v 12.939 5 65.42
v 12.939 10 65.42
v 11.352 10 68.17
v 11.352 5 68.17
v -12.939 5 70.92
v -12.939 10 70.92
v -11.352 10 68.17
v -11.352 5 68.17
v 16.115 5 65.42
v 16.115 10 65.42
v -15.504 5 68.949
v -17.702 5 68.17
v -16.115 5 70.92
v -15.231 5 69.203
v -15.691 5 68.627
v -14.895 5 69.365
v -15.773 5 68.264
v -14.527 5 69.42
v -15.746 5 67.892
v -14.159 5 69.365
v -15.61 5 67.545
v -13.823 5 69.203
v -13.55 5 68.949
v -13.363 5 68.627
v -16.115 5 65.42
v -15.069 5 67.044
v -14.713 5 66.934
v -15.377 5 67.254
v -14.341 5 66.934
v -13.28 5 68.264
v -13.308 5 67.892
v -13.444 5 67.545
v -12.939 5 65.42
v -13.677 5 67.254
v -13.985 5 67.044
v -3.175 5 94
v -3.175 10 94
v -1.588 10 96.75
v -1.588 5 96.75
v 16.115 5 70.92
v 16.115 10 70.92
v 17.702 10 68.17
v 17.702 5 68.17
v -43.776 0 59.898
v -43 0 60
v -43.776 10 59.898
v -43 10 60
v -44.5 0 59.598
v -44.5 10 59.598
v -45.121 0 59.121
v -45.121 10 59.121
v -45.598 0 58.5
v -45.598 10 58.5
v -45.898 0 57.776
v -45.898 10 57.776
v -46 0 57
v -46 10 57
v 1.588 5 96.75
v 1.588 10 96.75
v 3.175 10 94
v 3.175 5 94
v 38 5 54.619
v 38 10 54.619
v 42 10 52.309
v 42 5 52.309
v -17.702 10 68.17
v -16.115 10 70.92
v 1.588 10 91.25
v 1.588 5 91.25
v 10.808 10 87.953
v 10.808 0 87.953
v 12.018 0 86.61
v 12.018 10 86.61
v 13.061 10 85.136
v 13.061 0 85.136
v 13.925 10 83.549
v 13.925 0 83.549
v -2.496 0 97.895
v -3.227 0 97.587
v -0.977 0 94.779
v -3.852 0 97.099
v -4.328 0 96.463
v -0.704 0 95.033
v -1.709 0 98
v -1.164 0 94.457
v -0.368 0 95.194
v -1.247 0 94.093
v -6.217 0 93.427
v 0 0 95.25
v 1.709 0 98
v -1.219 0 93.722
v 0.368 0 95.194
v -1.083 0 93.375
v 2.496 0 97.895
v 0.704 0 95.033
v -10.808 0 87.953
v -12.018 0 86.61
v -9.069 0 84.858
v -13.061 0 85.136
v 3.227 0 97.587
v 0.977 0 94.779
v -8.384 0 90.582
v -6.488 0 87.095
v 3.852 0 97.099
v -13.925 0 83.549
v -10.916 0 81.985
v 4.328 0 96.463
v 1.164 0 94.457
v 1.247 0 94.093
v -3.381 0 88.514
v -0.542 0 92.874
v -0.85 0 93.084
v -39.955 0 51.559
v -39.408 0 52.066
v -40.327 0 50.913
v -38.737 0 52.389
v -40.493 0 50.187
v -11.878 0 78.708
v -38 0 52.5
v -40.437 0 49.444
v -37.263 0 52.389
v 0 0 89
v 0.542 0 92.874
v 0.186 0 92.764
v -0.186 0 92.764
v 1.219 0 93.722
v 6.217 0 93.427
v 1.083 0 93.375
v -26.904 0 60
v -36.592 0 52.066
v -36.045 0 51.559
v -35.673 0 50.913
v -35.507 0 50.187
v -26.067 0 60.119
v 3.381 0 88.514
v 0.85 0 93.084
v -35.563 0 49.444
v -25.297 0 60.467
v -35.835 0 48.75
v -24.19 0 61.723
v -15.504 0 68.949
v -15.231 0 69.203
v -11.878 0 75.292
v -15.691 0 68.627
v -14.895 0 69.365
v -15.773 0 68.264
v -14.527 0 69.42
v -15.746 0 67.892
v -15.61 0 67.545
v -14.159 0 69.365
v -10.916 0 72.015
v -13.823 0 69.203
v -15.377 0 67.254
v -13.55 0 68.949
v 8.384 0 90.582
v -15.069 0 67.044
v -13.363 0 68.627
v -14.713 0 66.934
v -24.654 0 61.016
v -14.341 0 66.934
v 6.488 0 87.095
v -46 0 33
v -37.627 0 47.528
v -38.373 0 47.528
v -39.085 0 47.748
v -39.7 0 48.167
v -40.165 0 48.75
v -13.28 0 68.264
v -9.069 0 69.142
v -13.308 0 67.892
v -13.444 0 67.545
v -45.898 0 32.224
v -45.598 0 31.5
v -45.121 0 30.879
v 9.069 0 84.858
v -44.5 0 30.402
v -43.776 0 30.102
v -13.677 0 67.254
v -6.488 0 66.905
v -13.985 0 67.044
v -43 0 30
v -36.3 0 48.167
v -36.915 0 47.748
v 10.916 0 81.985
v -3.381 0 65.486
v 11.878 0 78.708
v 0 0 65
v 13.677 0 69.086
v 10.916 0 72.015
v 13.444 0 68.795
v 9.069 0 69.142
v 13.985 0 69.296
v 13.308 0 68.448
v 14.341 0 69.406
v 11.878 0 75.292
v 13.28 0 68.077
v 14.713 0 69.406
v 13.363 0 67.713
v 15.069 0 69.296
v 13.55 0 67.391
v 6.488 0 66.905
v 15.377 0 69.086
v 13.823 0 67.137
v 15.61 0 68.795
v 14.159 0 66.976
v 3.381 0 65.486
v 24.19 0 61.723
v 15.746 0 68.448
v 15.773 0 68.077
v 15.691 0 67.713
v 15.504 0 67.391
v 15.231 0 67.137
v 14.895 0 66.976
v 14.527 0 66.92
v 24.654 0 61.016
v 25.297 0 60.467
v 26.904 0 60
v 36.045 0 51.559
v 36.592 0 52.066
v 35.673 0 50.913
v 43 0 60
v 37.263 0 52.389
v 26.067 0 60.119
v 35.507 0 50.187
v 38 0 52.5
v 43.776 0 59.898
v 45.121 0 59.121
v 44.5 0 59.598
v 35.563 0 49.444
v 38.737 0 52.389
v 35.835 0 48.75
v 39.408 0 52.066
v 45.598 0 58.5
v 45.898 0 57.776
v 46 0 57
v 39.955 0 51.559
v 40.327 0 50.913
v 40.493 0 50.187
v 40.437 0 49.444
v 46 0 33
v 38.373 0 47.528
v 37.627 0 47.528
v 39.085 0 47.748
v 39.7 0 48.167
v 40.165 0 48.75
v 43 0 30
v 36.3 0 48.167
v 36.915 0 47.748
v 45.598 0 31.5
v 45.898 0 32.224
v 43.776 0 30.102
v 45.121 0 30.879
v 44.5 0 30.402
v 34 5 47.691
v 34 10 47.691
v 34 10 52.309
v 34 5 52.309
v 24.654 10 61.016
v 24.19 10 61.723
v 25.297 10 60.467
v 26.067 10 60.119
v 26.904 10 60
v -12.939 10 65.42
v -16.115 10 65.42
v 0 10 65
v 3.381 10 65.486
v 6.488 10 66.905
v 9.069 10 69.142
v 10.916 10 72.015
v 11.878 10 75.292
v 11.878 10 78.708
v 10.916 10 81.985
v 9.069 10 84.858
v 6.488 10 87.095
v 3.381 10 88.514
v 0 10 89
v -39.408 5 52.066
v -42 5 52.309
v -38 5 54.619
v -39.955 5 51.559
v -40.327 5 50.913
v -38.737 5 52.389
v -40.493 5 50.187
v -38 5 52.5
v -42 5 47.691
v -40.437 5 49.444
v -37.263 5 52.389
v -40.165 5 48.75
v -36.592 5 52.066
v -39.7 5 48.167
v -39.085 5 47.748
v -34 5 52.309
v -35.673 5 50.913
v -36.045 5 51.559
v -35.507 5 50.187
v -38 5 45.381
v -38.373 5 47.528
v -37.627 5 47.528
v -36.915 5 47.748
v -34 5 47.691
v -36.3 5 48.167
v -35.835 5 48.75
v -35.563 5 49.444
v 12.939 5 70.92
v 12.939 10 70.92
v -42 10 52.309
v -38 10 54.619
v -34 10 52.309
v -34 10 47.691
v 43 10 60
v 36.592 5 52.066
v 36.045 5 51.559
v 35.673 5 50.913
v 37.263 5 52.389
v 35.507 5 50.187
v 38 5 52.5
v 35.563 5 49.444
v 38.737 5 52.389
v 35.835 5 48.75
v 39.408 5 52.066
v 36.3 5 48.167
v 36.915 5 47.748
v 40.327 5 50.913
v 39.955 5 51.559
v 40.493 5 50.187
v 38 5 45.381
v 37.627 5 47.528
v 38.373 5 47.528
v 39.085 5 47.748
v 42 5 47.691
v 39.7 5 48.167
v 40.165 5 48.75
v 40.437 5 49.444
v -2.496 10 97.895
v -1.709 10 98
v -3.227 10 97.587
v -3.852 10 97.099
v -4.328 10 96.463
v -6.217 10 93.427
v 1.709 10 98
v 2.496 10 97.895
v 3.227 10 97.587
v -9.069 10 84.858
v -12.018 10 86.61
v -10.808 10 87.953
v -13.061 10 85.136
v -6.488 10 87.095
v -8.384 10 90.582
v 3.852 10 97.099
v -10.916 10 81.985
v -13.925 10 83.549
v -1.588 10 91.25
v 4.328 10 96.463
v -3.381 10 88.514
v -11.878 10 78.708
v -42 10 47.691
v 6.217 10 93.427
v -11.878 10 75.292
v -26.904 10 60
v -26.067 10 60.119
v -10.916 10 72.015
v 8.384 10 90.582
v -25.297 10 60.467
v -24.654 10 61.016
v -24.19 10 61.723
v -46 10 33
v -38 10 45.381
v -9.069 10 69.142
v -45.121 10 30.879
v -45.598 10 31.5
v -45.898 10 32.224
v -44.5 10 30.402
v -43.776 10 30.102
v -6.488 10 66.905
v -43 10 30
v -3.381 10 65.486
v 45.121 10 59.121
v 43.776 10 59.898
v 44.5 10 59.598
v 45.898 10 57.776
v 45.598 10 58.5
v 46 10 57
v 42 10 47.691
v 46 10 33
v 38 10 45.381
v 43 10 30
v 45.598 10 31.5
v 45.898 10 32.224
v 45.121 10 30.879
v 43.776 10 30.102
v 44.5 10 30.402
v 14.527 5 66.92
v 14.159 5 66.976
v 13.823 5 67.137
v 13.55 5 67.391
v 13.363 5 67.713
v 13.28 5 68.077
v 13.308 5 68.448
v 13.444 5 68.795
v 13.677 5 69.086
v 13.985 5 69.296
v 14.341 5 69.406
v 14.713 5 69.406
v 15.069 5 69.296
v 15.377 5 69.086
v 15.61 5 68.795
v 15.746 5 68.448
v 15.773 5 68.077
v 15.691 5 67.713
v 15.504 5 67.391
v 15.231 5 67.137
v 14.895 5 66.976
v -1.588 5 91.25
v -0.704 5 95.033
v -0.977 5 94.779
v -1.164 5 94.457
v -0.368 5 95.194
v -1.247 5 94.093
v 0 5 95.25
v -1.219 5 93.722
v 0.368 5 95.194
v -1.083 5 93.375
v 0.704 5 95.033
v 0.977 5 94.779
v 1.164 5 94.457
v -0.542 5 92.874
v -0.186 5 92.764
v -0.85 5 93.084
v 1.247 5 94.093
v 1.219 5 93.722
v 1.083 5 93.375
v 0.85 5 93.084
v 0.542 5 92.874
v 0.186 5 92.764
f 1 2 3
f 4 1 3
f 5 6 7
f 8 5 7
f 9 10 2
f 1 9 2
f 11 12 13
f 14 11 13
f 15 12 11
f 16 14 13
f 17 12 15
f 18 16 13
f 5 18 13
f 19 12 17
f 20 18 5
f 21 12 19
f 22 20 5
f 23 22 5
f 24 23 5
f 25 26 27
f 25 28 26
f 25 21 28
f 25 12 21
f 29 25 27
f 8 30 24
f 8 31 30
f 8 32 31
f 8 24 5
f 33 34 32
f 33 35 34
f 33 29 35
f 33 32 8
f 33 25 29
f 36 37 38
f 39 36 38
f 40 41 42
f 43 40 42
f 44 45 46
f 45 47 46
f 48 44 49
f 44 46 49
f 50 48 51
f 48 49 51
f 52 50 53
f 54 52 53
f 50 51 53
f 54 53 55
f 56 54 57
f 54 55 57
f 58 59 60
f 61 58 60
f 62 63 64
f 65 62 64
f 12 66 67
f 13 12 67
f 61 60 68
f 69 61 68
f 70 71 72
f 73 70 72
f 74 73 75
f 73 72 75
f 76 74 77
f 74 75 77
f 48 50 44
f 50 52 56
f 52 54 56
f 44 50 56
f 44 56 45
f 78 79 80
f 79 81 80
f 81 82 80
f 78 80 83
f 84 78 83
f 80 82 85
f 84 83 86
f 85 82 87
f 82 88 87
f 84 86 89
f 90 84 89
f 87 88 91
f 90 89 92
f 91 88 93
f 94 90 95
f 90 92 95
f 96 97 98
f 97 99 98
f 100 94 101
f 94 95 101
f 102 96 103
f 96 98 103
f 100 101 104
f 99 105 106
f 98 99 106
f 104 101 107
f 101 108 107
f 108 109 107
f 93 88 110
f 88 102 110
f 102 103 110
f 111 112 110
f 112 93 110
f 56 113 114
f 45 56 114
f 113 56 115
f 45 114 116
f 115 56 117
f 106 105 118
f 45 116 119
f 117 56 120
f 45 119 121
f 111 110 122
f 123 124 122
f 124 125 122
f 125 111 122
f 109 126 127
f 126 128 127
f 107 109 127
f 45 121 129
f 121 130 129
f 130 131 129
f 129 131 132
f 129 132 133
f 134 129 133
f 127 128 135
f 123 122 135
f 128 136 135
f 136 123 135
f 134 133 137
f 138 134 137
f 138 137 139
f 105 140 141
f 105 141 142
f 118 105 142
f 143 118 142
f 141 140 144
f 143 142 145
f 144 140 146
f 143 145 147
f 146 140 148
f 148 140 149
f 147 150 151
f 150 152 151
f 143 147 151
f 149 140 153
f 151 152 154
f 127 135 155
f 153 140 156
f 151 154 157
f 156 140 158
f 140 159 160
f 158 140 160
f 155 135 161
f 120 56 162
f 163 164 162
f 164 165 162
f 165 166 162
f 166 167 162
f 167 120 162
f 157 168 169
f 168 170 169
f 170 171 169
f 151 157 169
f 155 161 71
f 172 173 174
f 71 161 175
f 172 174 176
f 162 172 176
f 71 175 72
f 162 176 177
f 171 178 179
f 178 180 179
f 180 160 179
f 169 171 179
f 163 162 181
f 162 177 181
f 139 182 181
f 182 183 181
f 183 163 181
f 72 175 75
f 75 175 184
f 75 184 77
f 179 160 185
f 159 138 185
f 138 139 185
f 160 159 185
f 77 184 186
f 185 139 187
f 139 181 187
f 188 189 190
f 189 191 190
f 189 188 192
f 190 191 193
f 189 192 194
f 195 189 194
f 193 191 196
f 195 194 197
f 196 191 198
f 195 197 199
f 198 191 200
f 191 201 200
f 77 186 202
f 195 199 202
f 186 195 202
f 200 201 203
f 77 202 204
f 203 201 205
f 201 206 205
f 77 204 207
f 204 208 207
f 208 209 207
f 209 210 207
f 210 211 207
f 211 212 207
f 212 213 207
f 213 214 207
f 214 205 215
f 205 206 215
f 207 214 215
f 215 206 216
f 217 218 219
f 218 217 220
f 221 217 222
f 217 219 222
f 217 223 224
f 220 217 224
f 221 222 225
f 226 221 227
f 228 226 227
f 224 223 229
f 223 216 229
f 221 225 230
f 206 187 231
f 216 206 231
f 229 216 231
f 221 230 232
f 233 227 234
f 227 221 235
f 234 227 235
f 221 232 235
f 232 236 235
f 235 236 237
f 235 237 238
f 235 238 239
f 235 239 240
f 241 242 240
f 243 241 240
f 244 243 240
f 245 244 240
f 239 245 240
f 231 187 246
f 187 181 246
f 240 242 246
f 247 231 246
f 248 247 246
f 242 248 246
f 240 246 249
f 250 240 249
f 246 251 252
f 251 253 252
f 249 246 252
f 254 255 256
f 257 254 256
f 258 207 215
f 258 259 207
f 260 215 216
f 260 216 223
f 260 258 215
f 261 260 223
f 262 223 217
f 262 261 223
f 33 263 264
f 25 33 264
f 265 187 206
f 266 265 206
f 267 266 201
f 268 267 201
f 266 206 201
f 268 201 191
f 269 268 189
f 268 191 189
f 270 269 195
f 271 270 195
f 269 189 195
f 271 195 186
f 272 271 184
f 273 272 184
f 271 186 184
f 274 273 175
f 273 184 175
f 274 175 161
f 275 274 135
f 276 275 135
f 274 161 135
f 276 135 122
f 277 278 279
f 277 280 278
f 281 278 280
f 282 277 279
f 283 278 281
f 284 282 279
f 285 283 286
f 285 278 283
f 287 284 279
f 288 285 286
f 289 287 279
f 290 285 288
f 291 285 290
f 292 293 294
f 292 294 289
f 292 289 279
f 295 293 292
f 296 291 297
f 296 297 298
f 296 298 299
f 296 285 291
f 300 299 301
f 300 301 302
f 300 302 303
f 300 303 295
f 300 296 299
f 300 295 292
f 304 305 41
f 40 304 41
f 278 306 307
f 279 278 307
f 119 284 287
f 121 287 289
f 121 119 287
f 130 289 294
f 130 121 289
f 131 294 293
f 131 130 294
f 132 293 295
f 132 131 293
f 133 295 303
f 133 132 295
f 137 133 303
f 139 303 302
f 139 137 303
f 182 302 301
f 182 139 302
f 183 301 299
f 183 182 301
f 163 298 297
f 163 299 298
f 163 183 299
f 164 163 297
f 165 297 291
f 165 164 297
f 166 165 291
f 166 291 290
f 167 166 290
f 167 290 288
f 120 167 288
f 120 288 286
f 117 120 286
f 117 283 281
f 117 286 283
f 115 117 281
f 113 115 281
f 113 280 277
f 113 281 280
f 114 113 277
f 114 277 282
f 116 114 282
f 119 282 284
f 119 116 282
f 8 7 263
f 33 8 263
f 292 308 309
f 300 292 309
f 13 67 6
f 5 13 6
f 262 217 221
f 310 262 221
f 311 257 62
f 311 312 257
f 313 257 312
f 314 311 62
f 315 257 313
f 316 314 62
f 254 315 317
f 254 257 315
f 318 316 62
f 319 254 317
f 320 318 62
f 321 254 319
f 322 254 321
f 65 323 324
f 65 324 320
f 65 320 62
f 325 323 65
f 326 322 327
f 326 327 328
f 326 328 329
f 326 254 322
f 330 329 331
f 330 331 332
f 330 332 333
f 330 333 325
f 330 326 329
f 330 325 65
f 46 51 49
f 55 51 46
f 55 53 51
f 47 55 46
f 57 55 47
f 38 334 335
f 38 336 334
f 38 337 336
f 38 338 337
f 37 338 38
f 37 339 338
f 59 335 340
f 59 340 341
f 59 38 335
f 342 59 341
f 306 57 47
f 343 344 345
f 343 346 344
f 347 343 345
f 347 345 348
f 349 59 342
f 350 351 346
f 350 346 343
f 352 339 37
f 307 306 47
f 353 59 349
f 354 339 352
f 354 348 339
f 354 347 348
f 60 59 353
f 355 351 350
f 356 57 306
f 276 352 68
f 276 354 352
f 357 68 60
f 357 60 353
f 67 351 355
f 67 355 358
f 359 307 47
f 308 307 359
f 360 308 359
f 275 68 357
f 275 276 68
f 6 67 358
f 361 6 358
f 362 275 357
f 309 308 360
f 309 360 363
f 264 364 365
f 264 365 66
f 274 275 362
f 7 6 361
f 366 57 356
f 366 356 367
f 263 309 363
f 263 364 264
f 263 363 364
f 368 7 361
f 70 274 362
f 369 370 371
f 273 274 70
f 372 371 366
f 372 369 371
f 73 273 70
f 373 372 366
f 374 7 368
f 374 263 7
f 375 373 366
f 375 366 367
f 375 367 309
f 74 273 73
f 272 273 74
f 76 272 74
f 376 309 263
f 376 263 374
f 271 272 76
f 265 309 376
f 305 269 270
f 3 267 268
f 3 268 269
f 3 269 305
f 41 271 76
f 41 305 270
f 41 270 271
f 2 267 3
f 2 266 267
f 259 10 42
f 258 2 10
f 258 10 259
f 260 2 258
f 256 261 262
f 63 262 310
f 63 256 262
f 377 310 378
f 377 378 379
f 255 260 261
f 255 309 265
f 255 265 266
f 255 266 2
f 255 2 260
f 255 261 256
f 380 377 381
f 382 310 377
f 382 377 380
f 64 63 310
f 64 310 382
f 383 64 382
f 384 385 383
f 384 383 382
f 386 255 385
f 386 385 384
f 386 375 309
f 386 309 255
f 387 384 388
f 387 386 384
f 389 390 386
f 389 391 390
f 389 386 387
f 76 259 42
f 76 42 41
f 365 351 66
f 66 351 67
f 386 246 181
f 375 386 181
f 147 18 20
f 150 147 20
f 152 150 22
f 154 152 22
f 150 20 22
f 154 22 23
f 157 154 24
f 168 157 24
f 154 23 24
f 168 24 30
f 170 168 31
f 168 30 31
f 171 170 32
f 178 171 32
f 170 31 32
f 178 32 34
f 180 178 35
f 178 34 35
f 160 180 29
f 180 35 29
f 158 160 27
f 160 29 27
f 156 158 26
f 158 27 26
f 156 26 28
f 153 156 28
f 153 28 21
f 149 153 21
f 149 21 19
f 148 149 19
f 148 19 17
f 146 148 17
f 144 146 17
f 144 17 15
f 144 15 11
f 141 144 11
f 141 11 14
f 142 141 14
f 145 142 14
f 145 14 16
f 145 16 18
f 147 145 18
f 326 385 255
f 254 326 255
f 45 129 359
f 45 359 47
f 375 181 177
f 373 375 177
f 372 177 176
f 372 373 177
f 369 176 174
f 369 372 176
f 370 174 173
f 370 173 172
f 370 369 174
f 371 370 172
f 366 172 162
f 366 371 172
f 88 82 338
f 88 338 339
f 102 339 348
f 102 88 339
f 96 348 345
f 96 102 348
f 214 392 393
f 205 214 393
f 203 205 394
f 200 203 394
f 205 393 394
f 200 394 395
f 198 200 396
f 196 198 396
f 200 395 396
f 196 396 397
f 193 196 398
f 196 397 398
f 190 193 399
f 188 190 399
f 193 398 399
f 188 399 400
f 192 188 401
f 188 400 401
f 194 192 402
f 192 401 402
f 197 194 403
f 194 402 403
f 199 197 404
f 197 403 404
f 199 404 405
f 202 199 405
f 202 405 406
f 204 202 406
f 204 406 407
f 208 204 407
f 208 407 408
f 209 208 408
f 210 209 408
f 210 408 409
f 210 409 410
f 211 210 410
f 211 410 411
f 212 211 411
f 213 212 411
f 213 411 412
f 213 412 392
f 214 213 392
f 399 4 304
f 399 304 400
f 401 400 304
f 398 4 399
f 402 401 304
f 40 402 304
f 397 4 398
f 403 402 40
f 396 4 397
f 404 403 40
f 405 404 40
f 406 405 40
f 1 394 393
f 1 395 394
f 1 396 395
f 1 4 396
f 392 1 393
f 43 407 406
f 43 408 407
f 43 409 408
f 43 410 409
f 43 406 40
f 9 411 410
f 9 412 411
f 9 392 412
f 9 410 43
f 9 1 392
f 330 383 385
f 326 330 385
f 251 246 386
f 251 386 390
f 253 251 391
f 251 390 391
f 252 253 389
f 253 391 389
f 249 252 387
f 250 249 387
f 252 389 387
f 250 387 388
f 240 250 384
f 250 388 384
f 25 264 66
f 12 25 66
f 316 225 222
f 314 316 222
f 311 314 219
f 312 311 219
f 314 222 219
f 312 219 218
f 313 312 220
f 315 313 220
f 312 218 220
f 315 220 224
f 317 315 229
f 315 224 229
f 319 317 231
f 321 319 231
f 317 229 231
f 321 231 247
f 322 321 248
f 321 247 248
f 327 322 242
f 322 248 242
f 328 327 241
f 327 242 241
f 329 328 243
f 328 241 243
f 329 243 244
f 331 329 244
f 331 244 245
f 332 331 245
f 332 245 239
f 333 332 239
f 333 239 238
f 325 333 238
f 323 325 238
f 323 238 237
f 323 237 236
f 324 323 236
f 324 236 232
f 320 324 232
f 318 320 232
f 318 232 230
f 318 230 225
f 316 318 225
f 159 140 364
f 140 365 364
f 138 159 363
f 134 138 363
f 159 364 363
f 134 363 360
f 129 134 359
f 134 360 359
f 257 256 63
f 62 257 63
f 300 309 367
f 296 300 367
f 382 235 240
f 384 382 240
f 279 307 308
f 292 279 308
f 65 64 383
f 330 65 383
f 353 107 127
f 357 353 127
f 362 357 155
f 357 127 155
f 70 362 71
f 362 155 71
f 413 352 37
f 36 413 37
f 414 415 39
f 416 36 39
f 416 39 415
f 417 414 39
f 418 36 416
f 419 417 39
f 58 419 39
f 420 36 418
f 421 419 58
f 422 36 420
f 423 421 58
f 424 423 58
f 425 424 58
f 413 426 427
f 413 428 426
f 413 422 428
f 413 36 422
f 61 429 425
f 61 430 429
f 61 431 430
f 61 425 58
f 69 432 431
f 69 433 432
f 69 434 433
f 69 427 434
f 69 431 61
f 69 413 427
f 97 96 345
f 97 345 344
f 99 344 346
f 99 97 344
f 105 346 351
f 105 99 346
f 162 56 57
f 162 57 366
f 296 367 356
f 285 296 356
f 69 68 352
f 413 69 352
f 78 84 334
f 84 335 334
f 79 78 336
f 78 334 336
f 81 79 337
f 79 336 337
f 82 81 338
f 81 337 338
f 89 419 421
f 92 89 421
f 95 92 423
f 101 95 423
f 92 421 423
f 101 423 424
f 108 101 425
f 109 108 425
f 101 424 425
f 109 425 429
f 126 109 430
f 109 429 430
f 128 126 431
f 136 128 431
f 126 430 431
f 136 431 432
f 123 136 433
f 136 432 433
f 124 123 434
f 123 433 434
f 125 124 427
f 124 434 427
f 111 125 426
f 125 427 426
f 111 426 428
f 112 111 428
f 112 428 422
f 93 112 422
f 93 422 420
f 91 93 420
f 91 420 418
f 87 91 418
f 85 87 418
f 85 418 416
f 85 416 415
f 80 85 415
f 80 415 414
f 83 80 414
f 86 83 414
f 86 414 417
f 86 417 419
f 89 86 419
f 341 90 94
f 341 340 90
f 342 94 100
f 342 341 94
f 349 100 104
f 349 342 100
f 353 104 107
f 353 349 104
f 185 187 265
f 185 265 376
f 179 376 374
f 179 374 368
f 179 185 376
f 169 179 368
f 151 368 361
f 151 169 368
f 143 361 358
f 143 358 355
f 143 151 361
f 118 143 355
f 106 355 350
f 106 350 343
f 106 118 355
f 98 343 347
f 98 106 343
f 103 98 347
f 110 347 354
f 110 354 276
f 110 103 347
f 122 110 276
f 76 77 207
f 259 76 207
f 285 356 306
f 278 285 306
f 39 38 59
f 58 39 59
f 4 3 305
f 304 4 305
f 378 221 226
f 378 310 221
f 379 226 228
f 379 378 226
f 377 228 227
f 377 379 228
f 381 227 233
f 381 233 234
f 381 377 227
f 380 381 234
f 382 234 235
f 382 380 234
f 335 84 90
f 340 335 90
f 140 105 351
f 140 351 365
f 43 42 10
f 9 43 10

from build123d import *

# Parameters (mm, degrees)
ESQUISSE2_R             = 2.5
BOSS_EXTRU_1_DEPTH      = 10
CONG_1_R                = 3
ESQUISSE4_R             = 1.25
ENL_V_MAT_EXTRU_2_DEPTH = 109.719823399
ENL_V_MAT_EXTRU_3_DEPTH = 5


with BuildPart() as part:
    # Esquisse2 → Boss.-Extru.1 (new body)
    with BuildSketch(Plane(origin=(0, 0, 0), x_dir=(1, 0, 0), z_dir=(0, 1, 0))):
        with BuildLine():
            Line((0, -98), (-3.514709064, -98))
            ThreePointArc((-3.514709064, -98), (-6.748469646, -92.676394089), (-10.808475025, -87.952588026))
            ThreePointArc((-10.808475025, -87.952588026), (-12.561008366, -85.888384873), (-13.92457187, -83.548939995))
            Line((-13.92457187, -83.548939995), (-25, -60))
            Line((-25, -60), (-46, -60))
            Line((-46, -60), (-46, -30))
            Line((-46, -30), (0, -30))
            Line((0, -30), (0, -43.5))
            Line((0, -43.5), (0, -46.5))
            Line((0, -46.5), (0, -65))
            ThreePointArc((0, -65), (-12, -77), (0, -89))
            Line((0, -89), (0, -98))
        make_face()
        with Locations(Location((-38, -50, 0), (0, 0, 270))):
            Circle(ESQUISSE2_R, mode=Mode.SUBTRACT)
    extrude(amount=BOSS_EXTRU_1_DEPTH)

    # Congé1
    cong_1_edges = [part.edges().sort_by_distance(p)[0] for p in [
        (-46, 5, 30),
        (-3.514709064, 5, 98),
        (-25, 5, 60),
        (-46, 5, 60),
    ]]
    fillet(cong_1_edges, radius=CONG_1_R)

    # Symétrie1: part across face


with BuildPart() as part_1:
    add(part.part)
    add(part.part.mirror(Plane(origin=(0, 5, 47.5), x_dir=(0, 0, 1), z_dir=(1, 0, 0))))

    # Esquisse4 → Enlèv. mat.-Extru.2 (cut, through all)
    with BuildSketch(Plane(origin=(0, 10, 0), x_dir=(1, 0, 0), z_dir=(0, 1, 0))):
        with Locations(Location((-14.526993136, -68.170137576, 0), (0, 0, 270))):
            Circle(ESQUISSE4_R)
        with Locations(Location((0, -94, 0), (0, 0, 270))):
            Circle(ESQUISSE4_R)
        with Locations(Location((14.526993136, -68.170137576, 0), (0, 0, 90))):
            Circle(ESQUISSE4_R)
    extrude(amount=-ENL_V_MAT_EXTRU_2_DEPTH, mode=Mode.SUBTRACT)

    # Esquisse5 → Enlèv. mat.-Extru.3 (cut)
    with BuildSketch(Plane(origin=(0, 10, 0), x_dir=(1, 0, 0), z_dir=(0, 1, 0))):
        Polygon((-11.351566655, -68.170137576), (-12.939279895, -65.420137576), (-16.114706376, -65.420137576), (-17.702419616, -68.170137576), (-16.114706376, -70.920137576), (-12.939279895, -70.920137576), align=None)
        Polygon((17.702419616, -68.170137576), (16.114706376, -65.420137576), (12.939279895, -65.420137576), (11.351566655, -68.170137576), (12.939279895, -70.920137576), (16.114706376, -70.920137576), align=None)
        Polygon((3.175426481, -94), (1.58771324, -91.25), (-1.58771324, -91.25), (-3.175426481, -94), (-1.58771324, -96.75), (1.58771324, -96.75), align=None)
        Polygon((-34, -47.690598923), (-38, -45.381197846), (-42, -47.690598923), (-42, -52.309401077), (-38, -54.618802154), (-34, -52.309401077), align=None)
        Polygon((42, -52.309401077), (42, -47.690598923), (38, -45.381197846), (34, -47.690598923), (34, -52.309401077), (38, -54.618802154), align=None)
    extrude(amount=-ENL_V_MAT_EXTRU_3_DEPTH, mode=Mode.SUBTRACT)


solid = part_1.part
